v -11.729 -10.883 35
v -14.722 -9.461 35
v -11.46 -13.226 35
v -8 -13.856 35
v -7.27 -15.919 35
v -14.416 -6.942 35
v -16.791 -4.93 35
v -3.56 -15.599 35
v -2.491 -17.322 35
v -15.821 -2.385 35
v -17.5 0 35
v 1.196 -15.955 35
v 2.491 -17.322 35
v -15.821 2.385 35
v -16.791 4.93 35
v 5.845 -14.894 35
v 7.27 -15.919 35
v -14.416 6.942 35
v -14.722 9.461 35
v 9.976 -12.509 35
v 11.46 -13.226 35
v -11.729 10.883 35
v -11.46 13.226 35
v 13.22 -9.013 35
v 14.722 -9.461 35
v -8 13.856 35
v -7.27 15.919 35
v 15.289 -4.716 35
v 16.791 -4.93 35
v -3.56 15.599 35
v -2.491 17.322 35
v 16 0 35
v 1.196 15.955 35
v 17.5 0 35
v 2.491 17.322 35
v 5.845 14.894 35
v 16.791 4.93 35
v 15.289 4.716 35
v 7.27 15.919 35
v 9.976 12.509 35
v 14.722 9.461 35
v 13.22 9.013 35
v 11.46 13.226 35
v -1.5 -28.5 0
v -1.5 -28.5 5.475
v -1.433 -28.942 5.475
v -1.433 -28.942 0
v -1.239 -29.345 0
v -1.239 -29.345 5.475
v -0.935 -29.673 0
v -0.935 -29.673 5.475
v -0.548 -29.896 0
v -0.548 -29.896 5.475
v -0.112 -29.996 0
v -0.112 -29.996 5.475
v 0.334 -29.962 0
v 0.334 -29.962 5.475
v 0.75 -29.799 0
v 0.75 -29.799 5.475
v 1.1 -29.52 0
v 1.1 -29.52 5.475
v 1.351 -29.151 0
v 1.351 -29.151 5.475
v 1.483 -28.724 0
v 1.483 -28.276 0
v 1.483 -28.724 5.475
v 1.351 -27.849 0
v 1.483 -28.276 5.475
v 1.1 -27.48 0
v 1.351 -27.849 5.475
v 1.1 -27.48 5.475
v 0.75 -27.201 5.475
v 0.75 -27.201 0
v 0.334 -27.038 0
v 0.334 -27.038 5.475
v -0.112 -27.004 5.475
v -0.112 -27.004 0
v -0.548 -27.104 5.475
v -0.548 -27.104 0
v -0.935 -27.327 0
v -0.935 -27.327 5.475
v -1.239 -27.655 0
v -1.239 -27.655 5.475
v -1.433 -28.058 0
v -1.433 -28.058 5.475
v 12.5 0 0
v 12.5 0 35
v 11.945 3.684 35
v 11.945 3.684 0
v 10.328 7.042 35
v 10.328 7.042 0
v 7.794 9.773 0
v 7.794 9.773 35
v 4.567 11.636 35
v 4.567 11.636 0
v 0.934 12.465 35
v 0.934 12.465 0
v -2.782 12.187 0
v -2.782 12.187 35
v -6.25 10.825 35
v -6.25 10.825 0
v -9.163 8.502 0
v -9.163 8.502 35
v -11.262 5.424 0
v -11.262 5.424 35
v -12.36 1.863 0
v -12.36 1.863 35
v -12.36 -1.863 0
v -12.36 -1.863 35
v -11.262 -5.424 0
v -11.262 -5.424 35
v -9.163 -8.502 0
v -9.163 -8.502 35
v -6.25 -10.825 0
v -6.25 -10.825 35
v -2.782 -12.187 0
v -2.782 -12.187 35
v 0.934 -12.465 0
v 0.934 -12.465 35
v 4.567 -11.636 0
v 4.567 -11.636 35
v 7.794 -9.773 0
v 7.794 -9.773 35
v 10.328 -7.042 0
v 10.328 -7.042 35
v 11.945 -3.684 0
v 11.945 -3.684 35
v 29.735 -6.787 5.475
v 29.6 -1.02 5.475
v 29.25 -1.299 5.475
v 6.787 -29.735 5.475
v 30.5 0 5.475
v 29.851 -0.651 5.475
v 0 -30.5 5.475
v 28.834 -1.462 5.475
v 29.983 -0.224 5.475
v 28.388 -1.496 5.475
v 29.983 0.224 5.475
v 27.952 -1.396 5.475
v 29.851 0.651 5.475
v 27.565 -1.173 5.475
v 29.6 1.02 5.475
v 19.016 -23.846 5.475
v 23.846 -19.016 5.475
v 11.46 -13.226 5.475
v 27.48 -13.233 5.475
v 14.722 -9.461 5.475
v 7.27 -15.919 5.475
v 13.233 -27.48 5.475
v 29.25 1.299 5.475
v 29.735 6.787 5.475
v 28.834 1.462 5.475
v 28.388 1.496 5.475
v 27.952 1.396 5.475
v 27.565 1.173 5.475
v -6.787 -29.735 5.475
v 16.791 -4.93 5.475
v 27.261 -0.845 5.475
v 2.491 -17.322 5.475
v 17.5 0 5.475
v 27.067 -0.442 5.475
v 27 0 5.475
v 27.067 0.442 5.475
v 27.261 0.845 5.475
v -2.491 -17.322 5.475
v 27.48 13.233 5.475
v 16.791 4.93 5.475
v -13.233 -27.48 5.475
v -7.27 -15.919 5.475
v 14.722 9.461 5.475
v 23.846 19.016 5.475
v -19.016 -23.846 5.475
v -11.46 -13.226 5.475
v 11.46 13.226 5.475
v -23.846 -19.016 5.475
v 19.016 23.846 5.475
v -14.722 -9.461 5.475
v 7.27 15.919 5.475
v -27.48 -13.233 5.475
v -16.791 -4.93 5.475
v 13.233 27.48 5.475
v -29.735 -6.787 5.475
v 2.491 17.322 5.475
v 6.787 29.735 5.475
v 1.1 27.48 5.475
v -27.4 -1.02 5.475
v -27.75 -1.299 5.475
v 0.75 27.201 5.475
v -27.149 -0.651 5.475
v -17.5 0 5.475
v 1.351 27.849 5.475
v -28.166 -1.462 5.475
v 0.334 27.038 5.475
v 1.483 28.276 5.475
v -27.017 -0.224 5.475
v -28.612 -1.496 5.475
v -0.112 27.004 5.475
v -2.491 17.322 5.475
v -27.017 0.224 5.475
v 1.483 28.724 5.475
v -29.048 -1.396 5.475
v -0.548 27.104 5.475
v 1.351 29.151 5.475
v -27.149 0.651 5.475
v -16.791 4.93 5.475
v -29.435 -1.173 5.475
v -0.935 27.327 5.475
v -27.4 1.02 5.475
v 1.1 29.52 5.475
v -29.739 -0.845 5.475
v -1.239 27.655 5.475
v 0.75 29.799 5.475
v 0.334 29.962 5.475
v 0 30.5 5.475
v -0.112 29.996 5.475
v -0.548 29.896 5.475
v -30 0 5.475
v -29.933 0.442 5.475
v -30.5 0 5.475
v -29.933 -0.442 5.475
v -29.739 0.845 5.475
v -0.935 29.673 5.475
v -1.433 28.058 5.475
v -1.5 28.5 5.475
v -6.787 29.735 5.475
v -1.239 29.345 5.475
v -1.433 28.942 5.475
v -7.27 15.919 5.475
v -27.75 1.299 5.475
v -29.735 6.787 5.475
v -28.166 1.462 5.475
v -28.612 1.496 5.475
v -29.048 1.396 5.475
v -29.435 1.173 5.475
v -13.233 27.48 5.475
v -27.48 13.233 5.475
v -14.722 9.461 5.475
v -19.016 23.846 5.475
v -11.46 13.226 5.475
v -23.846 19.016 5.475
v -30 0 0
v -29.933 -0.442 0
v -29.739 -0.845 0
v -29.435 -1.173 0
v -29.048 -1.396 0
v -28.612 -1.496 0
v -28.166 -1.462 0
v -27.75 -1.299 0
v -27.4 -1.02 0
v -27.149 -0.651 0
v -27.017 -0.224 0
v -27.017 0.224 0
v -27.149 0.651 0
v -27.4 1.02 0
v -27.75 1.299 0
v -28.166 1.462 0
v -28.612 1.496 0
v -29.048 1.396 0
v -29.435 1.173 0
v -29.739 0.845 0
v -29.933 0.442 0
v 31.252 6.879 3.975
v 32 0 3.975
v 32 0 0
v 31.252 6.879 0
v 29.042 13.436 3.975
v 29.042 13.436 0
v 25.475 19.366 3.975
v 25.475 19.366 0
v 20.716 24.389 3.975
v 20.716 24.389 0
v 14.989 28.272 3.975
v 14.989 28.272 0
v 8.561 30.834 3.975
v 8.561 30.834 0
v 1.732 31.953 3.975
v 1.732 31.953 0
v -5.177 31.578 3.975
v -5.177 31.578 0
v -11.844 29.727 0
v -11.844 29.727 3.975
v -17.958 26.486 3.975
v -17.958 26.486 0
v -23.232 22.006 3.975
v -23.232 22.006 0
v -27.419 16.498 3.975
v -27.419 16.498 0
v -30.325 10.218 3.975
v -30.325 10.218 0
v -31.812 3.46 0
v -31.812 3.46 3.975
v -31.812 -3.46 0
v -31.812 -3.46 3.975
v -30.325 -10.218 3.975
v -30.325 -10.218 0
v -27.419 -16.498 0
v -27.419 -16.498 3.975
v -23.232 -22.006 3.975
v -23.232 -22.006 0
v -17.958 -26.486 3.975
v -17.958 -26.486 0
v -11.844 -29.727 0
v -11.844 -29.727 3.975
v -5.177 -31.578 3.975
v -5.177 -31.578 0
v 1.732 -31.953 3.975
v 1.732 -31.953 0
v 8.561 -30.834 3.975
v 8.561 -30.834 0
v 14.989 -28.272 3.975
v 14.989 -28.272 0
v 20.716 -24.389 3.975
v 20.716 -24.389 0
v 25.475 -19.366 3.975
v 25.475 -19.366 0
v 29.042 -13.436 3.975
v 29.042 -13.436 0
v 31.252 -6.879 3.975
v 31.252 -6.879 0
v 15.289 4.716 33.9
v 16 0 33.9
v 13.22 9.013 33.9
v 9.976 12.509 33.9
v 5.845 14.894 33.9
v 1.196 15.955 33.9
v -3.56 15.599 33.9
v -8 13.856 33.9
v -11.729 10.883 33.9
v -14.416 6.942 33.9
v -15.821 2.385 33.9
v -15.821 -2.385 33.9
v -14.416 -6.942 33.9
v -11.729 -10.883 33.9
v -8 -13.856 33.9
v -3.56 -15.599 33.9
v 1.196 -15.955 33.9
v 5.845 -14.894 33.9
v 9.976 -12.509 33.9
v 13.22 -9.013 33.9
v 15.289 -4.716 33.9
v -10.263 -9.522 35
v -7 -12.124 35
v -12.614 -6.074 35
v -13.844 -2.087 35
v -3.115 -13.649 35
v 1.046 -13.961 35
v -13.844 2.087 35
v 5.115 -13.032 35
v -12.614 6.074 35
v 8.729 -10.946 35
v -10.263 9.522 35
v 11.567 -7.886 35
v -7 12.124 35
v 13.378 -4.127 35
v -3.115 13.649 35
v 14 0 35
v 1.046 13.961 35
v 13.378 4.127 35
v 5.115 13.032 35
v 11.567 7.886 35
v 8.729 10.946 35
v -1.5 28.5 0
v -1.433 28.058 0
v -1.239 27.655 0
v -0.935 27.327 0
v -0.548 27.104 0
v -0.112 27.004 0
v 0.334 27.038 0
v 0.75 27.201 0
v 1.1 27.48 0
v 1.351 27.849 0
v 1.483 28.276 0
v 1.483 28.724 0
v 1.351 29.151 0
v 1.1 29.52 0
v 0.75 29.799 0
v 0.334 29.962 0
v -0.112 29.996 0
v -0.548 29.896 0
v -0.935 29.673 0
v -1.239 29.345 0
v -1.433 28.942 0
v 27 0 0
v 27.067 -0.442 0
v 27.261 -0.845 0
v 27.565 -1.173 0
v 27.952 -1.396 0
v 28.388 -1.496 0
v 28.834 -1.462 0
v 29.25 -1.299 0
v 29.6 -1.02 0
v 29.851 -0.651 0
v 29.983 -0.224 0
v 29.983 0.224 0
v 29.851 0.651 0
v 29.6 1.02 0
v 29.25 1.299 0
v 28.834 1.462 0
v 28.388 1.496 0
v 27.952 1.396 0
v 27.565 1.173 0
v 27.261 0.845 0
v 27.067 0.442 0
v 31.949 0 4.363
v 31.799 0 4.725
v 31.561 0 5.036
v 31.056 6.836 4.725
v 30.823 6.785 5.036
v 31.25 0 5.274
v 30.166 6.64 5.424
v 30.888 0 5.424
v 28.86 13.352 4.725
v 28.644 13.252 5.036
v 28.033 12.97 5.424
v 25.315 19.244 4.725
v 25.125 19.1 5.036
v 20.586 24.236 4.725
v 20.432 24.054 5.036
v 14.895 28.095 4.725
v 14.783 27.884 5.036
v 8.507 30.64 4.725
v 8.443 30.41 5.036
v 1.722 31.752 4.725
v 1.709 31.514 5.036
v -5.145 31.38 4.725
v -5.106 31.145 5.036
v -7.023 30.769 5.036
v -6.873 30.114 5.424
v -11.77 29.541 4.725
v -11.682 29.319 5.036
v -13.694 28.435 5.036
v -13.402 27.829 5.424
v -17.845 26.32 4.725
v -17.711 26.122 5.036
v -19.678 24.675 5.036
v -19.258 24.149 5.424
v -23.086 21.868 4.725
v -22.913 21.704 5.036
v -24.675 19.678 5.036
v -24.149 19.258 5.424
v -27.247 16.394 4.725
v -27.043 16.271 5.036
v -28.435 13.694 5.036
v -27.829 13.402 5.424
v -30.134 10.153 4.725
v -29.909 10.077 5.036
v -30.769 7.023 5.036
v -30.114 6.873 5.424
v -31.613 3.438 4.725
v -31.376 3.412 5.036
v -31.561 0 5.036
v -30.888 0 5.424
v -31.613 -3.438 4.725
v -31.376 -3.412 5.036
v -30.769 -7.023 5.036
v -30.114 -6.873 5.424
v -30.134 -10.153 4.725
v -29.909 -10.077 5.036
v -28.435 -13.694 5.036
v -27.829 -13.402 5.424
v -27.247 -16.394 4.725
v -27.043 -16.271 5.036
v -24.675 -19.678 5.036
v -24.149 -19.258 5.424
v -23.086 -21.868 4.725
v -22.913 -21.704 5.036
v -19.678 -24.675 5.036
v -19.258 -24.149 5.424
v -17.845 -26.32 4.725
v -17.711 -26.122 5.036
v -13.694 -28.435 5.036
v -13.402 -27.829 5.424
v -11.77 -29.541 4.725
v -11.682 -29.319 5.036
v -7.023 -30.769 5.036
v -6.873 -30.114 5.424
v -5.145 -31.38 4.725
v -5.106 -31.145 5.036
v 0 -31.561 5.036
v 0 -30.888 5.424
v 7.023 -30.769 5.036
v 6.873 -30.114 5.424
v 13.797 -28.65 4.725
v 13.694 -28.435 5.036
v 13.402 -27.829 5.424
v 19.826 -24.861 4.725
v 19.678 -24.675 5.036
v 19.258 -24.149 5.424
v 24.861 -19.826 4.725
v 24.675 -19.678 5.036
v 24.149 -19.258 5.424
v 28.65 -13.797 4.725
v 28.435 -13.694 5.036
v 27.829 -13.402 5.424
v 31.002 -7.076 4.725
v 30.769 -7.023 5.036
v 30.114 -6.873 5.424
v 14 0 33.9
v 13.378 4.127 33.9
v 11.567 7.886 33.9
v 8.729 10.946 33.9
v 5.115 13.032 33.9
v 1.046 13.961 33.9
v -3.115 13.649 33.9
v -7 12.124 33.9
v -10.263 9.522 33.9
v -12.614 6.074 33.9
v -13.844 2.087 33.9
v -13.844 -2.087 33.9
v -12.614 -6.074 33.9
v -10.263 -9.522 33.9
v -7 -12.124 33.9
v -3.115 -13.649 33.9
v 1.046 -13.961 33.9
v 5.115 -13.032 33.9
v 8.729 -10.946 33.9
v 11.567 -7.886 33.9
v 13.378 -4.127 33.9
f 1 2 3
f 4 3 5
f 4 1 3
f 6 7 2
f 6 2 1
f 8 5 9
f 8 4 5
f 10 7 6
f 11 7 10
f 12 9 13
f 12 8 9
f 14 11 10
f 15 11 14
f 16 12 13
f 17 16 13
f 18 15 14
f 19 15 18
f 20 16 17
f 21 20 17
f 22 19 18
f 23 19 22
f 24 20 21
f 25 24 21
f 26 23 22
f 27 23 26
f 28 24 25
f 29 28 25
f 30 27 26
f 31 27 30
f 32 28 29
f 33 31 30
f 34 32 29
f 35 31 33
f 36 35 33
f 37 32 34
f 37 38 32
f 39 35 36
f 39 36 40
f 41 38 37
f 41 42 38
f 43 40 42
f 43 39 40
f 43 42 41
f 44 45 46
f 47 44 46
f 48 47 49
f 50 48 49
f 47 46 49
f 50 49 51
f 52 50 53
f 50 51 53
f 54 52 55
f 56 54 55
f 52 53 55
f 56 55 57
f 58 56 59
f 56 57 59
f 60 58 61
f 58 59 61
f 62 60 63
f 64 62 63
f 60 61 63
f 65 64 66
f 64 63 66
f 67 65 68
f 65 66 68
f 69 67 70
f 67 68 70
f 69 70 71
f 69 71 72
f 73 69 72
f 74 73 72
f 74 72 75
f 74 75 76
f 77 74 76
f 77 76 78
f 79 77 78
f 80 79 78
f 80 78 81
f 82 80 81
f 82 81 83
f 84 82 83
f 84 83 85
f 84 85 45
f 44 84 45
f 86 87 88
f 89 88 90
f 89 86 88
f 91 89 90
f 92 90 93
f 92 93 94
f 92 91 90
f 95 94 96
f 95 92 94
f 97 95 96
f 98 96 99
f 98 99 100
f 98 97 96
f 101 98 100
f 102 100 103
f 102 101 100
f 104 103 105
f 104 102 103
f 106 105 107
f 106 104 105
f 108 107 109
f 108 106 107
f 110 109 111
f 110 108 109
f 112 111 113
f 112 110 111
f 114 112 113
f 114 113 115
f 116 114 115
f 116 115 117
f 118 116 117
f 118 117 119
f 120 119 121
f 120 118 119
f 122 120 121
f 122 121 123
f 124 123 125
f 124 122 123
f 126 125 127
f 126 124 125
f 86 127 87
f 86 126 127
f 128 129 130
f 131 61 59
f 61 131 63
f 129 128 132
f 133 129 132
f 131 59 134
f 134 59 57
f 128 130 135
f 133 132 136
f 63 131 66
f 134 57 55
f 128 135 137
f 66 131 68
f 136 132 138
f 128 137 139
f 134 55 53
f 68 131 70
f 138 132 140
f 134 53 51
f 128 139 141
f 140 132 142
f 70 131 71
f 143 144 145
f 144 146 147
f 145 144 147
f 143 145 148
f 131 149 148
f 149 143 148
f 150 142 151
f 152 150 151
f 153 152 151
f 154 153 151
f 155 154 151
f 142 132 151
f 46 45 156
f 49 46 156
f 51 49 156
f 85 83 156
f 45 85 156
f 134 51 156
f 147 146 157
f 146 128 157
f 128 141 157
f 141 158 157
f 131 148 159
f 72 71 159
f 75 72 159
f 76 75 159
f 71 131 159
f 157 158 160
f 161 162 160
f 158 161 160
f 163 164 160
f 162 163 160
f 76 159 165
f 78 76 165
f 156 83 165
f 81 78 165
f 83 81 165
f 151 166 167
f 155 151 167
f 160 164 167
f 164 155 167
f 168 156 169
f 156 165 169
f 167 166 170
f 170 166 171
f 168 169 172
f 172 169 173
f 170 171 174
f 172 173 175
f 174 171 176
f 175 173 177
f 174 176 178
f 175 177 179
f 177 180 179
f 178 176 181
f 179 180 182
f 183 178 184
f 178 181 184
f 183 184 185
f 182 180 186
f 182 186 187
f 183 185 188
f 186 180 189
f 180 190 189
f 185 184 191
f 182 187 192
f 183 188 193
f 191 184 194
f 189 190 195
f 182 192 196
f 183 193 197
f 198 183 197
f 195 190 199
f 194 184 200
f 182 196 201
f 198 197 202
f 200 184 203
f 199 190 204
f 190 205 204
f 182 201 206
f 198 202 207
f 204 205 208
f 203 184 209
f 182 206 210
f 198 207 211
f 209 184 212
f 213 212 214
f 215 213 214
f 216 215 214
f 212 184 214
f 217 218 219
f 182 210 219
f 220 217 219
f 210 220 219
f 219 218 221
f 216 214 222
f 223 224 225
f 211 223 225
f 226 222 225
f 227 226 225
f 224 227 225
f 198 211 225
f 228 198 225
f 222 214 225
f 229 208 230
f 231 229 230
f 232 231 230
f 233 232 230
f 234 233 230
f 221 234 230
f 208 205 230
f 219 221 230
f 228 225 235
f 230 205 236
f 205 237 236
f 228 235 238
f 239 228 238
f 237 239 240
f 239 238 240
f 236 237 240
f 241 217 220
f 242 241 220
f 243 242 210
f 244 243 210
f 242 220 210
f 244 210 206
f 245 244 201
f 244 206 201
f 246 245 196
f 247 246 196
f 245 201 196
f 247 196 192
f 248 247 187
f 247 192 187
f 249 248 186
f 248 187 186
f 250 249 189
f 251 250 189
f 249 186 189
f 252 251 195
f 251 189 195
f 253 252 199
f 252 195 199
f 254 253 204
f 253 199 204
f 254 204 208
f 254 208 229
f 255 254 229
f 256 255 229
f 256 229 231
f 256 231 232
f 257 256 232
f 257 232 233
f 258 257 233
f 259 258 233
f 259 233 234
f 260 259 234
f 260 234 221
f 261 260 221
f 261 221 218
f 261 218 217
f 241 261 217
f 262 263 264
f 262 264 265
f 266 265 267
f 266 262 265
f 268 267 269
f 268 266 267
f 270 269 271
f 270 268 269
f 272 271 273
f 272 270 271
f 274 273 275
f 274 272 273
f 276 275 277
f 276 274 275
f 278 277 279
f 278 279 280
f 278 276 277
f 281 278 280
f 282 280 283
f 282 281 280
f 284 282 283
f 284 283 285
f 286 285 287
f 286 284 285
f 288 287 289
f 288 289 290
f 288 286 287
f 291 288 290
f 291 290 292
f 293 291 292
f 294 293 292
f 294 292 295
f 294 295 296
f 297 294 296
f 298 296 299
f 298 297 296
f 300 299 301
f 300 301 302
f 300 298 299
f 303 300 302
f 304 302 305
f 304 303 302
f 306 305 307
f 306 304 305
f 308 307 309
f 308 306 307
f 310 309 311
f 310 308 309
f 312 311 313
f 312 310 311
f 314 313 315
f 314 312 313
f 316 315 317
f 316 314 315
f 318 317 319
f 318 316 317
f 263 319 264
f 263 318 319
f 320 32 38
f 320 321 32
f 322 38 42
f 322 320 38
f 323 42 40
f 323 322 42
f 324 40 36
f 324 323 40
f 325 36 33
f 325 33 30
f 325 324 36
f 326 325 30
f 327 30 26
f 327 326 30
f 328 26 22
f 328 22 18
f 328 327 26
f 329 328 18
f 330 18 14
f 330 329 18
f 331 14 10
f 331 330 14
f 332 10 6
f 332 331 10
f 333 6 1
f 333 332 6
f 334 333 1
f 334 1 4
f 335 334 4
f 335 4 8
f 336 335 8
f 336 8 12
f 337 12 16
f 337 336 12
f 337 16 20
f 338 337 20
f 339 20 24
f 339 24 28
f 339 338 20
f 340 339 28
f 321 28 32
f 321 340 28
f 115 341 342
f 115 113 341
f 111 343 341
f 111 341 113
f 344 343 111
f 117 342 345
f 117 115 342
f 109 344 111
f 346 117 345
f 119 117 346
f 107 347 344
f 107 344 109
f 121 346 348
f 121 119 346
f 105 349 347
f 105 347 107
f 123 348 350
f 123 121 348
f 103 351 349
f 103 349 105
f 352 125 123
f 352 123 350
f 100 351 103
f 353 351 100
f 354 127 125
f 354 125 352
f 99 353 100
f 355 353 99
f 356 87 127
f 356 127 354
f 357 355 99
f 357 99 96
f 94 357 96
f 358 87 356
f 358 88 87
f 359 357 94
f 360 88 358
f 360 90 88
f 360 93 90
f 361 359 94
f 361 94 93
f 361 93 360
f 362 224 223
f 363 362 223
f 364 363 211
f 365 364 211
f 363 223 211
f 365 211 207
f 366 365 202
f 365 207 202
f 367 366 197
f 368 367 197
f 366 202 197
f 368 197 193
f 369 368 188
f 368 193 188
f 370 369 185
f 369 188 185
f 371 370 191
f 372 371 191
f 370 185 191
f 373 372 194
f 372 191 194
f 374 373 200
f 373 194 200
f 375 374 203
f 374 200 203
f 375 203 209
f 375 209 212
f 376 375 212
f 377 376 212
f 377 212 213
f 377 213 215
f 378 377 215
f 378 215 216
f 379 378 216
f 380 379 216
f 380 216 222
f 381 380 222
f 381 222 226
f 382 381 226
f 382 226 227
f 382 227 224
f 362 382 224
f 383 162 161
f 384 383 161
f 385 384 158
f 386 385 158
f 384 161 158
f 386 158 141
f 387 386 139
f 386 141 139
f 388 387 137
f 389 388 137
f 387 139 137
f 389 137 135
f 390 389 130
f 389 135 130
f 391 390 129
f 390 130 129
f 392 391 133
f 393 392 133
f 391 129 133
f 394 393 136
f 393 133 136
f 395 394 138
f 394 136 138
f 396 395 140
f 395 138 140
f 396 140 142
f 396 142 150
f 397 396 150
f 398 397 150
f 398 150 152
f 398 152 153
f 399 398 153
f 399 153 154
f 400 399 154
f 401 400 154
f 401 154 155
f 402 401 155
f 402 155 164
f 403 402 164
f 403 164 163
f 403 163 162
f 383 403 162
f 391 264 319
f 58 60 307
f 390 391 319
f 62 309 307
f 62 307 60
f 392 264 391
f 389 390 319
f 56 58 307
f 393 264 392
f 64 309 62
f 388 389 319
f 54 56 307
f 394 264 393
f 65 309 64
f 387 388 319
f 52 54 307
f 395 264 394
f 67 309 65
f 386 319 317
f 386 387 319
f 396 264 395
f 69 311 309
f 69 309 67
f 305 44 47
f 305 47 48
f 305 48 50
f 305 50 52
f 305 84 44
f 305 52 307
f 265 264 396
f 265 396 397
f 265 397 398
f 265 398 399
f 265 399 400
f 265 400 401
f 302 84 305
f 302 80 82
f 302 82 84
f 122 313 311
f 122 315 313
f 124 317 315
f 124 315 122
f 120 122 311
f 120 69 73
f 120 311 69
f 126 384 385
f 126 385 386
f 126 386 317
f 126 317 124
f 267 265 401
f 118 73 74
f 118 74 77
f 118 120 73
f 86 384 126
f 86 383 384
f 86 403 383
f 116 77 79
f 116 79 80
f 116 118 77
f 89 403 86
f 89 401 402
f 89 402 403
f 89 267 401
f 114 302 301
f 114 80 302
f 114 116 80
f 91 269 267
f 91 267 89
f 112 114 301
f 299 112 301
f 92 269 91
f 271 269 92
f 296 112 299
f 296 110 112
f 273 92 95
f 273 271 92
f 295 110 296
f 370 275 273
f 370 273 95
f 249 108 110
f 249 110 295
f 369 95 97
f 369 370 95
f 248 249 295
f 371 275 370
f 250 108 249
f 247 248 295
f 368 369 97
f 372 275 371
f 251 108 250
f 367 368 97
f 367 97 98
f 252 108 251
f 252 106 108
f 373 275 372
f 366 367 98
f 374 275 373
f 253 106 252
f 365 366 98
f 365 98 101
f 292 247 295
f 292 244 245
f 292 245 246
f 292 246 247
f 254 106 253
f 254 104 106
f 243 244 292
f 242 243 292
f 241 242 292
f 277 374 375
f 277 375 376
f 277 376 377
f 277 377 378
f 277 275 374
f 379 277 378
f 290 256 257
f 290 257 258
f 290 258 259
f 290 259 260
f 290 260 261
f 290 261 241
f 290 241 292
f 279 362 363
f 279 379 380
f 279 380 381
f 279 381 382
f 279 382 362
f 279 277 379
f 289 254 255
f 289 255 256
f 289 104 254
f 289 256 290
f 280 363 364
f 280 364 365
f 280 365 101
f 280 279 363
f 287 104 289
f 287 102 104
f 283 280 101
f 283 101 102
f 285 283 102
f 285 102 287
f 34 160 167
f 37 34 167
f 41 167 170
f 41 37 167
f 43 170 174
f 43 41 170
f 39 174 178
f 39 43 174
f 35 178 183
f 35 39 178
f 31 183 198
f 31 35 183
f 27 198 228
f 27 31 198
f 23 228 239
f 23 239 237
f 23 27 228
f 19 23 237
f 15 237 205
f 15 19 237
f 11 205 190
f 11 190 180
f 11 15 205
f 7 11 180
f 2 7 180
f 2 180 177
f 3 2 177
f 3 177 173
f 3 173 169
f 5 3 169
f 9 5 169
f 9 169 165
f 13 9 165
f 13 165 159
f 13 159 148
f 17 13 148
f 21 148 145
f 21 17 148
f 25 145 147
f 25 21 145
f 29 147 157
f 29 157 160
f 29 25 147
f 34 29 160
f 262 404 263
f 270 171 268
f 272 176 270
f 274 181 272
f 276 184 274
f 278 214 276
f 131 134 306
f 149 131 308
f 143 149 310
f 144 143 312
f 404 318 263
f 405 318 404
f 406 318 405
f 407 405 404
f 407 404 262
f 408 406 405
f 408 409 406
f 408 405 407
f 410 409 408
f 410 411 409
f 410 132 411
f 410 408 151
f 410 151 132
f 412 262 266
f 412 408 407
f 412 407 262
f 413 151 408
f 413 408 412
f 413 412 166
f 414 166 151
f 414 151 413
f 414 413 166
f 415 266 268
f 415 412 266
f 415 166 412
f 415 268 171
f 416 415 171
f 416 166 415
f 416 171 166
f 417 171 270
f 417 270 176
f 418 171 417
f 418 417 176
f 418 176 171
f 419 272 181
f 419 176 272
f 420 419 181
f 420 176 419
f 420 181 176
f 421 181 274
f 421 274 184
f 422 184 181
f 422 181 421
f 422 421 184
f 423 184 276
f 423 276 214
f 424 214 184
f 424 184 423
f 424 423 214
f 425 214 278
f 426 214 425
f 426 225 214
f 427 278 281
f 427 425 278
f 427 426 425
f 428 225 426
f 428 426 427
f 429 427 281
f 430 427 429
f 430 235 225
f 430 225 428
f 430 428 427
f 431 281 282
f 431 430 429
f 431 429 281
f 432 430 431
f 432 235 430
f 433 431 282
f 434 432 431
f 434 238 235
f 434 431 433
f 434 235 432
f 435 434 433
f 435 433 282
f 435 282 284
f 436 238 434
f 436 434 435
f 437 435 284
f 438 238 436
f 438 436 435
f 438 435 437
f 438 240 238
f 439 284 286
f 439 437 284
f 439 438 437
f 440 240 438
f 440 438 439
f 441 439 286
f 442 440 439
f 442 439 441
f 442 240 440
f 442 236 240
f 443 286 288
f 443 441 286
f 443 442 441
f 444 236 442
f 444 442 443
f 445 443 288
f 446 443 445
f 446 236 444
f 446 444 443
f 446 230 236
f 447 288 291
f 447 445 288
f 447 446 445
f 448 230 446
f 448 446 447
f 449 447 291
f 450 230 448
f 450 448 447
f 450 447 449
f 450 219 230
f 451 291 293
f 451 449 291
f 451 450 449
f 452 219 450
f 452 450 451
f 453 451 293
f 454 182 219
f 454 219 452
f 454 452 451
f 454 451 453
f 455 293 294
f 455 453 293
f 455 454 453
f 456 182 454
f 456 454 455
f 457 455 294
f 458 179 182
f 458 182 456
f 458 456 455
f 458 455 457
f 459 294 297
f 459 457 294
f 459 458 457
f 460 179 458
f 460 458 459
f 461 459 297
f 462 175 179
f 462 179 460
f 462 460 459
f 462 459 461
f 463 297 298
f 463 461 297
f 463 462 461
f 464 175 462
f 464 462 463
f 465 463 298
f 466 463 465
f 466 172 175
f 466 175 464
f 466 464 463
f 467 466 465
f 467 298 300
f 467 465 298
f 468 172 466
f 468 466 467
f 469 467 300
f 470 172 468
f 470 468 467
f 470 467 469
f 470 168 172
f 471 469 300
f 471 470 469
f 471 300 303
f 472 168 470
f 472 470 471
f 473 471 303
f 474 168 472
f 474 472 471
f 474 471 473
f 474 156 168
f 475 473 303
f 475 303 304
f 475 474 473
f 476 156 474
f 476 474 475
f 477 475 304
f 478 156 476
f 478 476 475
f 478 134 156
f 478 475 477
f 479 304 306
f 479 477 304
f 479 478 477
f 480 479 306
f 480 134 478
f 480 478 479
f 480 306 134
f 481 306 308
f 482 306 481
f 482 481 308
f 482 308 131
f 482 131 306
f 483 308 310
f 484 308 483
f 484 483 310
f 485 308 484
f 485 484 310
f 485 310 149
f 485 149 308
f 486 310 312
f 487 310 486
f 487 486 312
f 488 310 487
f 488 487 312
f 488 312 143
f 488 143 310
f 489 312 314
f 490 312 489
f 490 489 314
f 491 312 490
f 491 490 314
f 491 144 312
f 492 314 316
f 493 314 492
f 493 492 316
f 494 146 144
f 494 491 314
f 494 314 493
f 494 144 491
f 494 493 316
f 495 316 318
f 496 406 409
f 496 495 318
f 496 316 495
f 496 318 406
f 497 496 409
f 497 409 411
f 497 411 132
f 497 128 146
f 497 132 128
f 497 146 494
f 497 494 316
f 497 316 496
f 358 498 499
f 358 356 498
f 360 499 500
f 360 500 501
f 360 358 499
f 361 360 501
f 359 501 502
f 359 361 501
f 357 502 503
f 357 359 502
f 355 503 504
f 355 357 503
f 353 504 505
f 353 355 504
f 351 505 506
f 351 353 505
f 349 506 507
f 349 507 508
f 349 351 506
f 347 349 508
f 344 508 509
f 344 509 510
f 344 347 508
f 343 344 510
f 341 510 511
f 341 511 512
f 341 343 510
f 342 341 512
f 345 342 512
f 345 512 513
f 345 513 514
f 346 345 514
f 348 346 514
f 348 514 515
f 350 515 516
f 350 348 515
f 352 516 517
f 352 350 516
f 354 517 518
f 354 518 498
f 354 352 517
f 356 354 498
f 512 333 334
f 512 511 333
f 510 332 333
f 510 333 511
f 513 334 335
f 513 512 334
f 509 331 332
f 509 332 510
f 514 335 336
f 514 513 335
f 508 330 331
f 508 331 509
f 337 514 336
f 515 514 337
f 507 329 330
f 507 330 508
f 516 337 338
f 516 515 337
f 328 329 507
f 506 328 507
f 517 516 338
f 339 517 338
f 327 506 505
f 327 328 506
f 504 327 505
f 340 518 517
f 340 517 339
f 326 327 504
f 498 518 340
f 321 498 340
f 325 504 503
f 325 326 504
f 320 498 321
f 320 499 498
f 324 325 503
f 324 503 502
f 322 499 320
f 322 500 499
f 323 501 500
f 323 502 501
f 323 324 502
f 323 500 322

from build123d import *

# Parameters (mm, degrees)
F0_W   = 14.5
F0_H   = 5.4750965592
F0_W_2 = 5
F3_D   = 3
F4_R   = 1.5


with BuildPart() as f1:
    # F0 (on Front) → F1 (revolve)
    with BuildSketch(Plane.XZ):
        with Locations((24.75, 2.7375482796)):
            Rectangle(F0_W, F0_H)
        Polygon((12.5, 35), (12.5, 5.4750965592), (17.5, 5.4750965592), (17.5, 35), (16, 35), (16, 33.9), (14, 33.9), (14, 35), align=None)
        with Locations((15, 2.7375482796)):
            Rectangle(F0_W_2, F0_H)
    revolve(axis=Axis((0, 0, 26.583340019), (0, 0, 1)))

    # F3 (through all)
    with Locations(Plane(origin=(0, 0, 0), x_dir=(1, 0, 0), z_dir=(0, 0, -1))):
        with Locations((0, -28.5), (28.5, 0), (0, 28.5), (-28.5, 0)):
            Hole(F3_D / 2)

    # F4
    f4_edges = [f1.edges().sort_by_distance(p)[0] for p in [
        (-32, 0, 5.475097),
    ]]
    fillet(f4_edges, radius=F4_R)


solid = f1.part
